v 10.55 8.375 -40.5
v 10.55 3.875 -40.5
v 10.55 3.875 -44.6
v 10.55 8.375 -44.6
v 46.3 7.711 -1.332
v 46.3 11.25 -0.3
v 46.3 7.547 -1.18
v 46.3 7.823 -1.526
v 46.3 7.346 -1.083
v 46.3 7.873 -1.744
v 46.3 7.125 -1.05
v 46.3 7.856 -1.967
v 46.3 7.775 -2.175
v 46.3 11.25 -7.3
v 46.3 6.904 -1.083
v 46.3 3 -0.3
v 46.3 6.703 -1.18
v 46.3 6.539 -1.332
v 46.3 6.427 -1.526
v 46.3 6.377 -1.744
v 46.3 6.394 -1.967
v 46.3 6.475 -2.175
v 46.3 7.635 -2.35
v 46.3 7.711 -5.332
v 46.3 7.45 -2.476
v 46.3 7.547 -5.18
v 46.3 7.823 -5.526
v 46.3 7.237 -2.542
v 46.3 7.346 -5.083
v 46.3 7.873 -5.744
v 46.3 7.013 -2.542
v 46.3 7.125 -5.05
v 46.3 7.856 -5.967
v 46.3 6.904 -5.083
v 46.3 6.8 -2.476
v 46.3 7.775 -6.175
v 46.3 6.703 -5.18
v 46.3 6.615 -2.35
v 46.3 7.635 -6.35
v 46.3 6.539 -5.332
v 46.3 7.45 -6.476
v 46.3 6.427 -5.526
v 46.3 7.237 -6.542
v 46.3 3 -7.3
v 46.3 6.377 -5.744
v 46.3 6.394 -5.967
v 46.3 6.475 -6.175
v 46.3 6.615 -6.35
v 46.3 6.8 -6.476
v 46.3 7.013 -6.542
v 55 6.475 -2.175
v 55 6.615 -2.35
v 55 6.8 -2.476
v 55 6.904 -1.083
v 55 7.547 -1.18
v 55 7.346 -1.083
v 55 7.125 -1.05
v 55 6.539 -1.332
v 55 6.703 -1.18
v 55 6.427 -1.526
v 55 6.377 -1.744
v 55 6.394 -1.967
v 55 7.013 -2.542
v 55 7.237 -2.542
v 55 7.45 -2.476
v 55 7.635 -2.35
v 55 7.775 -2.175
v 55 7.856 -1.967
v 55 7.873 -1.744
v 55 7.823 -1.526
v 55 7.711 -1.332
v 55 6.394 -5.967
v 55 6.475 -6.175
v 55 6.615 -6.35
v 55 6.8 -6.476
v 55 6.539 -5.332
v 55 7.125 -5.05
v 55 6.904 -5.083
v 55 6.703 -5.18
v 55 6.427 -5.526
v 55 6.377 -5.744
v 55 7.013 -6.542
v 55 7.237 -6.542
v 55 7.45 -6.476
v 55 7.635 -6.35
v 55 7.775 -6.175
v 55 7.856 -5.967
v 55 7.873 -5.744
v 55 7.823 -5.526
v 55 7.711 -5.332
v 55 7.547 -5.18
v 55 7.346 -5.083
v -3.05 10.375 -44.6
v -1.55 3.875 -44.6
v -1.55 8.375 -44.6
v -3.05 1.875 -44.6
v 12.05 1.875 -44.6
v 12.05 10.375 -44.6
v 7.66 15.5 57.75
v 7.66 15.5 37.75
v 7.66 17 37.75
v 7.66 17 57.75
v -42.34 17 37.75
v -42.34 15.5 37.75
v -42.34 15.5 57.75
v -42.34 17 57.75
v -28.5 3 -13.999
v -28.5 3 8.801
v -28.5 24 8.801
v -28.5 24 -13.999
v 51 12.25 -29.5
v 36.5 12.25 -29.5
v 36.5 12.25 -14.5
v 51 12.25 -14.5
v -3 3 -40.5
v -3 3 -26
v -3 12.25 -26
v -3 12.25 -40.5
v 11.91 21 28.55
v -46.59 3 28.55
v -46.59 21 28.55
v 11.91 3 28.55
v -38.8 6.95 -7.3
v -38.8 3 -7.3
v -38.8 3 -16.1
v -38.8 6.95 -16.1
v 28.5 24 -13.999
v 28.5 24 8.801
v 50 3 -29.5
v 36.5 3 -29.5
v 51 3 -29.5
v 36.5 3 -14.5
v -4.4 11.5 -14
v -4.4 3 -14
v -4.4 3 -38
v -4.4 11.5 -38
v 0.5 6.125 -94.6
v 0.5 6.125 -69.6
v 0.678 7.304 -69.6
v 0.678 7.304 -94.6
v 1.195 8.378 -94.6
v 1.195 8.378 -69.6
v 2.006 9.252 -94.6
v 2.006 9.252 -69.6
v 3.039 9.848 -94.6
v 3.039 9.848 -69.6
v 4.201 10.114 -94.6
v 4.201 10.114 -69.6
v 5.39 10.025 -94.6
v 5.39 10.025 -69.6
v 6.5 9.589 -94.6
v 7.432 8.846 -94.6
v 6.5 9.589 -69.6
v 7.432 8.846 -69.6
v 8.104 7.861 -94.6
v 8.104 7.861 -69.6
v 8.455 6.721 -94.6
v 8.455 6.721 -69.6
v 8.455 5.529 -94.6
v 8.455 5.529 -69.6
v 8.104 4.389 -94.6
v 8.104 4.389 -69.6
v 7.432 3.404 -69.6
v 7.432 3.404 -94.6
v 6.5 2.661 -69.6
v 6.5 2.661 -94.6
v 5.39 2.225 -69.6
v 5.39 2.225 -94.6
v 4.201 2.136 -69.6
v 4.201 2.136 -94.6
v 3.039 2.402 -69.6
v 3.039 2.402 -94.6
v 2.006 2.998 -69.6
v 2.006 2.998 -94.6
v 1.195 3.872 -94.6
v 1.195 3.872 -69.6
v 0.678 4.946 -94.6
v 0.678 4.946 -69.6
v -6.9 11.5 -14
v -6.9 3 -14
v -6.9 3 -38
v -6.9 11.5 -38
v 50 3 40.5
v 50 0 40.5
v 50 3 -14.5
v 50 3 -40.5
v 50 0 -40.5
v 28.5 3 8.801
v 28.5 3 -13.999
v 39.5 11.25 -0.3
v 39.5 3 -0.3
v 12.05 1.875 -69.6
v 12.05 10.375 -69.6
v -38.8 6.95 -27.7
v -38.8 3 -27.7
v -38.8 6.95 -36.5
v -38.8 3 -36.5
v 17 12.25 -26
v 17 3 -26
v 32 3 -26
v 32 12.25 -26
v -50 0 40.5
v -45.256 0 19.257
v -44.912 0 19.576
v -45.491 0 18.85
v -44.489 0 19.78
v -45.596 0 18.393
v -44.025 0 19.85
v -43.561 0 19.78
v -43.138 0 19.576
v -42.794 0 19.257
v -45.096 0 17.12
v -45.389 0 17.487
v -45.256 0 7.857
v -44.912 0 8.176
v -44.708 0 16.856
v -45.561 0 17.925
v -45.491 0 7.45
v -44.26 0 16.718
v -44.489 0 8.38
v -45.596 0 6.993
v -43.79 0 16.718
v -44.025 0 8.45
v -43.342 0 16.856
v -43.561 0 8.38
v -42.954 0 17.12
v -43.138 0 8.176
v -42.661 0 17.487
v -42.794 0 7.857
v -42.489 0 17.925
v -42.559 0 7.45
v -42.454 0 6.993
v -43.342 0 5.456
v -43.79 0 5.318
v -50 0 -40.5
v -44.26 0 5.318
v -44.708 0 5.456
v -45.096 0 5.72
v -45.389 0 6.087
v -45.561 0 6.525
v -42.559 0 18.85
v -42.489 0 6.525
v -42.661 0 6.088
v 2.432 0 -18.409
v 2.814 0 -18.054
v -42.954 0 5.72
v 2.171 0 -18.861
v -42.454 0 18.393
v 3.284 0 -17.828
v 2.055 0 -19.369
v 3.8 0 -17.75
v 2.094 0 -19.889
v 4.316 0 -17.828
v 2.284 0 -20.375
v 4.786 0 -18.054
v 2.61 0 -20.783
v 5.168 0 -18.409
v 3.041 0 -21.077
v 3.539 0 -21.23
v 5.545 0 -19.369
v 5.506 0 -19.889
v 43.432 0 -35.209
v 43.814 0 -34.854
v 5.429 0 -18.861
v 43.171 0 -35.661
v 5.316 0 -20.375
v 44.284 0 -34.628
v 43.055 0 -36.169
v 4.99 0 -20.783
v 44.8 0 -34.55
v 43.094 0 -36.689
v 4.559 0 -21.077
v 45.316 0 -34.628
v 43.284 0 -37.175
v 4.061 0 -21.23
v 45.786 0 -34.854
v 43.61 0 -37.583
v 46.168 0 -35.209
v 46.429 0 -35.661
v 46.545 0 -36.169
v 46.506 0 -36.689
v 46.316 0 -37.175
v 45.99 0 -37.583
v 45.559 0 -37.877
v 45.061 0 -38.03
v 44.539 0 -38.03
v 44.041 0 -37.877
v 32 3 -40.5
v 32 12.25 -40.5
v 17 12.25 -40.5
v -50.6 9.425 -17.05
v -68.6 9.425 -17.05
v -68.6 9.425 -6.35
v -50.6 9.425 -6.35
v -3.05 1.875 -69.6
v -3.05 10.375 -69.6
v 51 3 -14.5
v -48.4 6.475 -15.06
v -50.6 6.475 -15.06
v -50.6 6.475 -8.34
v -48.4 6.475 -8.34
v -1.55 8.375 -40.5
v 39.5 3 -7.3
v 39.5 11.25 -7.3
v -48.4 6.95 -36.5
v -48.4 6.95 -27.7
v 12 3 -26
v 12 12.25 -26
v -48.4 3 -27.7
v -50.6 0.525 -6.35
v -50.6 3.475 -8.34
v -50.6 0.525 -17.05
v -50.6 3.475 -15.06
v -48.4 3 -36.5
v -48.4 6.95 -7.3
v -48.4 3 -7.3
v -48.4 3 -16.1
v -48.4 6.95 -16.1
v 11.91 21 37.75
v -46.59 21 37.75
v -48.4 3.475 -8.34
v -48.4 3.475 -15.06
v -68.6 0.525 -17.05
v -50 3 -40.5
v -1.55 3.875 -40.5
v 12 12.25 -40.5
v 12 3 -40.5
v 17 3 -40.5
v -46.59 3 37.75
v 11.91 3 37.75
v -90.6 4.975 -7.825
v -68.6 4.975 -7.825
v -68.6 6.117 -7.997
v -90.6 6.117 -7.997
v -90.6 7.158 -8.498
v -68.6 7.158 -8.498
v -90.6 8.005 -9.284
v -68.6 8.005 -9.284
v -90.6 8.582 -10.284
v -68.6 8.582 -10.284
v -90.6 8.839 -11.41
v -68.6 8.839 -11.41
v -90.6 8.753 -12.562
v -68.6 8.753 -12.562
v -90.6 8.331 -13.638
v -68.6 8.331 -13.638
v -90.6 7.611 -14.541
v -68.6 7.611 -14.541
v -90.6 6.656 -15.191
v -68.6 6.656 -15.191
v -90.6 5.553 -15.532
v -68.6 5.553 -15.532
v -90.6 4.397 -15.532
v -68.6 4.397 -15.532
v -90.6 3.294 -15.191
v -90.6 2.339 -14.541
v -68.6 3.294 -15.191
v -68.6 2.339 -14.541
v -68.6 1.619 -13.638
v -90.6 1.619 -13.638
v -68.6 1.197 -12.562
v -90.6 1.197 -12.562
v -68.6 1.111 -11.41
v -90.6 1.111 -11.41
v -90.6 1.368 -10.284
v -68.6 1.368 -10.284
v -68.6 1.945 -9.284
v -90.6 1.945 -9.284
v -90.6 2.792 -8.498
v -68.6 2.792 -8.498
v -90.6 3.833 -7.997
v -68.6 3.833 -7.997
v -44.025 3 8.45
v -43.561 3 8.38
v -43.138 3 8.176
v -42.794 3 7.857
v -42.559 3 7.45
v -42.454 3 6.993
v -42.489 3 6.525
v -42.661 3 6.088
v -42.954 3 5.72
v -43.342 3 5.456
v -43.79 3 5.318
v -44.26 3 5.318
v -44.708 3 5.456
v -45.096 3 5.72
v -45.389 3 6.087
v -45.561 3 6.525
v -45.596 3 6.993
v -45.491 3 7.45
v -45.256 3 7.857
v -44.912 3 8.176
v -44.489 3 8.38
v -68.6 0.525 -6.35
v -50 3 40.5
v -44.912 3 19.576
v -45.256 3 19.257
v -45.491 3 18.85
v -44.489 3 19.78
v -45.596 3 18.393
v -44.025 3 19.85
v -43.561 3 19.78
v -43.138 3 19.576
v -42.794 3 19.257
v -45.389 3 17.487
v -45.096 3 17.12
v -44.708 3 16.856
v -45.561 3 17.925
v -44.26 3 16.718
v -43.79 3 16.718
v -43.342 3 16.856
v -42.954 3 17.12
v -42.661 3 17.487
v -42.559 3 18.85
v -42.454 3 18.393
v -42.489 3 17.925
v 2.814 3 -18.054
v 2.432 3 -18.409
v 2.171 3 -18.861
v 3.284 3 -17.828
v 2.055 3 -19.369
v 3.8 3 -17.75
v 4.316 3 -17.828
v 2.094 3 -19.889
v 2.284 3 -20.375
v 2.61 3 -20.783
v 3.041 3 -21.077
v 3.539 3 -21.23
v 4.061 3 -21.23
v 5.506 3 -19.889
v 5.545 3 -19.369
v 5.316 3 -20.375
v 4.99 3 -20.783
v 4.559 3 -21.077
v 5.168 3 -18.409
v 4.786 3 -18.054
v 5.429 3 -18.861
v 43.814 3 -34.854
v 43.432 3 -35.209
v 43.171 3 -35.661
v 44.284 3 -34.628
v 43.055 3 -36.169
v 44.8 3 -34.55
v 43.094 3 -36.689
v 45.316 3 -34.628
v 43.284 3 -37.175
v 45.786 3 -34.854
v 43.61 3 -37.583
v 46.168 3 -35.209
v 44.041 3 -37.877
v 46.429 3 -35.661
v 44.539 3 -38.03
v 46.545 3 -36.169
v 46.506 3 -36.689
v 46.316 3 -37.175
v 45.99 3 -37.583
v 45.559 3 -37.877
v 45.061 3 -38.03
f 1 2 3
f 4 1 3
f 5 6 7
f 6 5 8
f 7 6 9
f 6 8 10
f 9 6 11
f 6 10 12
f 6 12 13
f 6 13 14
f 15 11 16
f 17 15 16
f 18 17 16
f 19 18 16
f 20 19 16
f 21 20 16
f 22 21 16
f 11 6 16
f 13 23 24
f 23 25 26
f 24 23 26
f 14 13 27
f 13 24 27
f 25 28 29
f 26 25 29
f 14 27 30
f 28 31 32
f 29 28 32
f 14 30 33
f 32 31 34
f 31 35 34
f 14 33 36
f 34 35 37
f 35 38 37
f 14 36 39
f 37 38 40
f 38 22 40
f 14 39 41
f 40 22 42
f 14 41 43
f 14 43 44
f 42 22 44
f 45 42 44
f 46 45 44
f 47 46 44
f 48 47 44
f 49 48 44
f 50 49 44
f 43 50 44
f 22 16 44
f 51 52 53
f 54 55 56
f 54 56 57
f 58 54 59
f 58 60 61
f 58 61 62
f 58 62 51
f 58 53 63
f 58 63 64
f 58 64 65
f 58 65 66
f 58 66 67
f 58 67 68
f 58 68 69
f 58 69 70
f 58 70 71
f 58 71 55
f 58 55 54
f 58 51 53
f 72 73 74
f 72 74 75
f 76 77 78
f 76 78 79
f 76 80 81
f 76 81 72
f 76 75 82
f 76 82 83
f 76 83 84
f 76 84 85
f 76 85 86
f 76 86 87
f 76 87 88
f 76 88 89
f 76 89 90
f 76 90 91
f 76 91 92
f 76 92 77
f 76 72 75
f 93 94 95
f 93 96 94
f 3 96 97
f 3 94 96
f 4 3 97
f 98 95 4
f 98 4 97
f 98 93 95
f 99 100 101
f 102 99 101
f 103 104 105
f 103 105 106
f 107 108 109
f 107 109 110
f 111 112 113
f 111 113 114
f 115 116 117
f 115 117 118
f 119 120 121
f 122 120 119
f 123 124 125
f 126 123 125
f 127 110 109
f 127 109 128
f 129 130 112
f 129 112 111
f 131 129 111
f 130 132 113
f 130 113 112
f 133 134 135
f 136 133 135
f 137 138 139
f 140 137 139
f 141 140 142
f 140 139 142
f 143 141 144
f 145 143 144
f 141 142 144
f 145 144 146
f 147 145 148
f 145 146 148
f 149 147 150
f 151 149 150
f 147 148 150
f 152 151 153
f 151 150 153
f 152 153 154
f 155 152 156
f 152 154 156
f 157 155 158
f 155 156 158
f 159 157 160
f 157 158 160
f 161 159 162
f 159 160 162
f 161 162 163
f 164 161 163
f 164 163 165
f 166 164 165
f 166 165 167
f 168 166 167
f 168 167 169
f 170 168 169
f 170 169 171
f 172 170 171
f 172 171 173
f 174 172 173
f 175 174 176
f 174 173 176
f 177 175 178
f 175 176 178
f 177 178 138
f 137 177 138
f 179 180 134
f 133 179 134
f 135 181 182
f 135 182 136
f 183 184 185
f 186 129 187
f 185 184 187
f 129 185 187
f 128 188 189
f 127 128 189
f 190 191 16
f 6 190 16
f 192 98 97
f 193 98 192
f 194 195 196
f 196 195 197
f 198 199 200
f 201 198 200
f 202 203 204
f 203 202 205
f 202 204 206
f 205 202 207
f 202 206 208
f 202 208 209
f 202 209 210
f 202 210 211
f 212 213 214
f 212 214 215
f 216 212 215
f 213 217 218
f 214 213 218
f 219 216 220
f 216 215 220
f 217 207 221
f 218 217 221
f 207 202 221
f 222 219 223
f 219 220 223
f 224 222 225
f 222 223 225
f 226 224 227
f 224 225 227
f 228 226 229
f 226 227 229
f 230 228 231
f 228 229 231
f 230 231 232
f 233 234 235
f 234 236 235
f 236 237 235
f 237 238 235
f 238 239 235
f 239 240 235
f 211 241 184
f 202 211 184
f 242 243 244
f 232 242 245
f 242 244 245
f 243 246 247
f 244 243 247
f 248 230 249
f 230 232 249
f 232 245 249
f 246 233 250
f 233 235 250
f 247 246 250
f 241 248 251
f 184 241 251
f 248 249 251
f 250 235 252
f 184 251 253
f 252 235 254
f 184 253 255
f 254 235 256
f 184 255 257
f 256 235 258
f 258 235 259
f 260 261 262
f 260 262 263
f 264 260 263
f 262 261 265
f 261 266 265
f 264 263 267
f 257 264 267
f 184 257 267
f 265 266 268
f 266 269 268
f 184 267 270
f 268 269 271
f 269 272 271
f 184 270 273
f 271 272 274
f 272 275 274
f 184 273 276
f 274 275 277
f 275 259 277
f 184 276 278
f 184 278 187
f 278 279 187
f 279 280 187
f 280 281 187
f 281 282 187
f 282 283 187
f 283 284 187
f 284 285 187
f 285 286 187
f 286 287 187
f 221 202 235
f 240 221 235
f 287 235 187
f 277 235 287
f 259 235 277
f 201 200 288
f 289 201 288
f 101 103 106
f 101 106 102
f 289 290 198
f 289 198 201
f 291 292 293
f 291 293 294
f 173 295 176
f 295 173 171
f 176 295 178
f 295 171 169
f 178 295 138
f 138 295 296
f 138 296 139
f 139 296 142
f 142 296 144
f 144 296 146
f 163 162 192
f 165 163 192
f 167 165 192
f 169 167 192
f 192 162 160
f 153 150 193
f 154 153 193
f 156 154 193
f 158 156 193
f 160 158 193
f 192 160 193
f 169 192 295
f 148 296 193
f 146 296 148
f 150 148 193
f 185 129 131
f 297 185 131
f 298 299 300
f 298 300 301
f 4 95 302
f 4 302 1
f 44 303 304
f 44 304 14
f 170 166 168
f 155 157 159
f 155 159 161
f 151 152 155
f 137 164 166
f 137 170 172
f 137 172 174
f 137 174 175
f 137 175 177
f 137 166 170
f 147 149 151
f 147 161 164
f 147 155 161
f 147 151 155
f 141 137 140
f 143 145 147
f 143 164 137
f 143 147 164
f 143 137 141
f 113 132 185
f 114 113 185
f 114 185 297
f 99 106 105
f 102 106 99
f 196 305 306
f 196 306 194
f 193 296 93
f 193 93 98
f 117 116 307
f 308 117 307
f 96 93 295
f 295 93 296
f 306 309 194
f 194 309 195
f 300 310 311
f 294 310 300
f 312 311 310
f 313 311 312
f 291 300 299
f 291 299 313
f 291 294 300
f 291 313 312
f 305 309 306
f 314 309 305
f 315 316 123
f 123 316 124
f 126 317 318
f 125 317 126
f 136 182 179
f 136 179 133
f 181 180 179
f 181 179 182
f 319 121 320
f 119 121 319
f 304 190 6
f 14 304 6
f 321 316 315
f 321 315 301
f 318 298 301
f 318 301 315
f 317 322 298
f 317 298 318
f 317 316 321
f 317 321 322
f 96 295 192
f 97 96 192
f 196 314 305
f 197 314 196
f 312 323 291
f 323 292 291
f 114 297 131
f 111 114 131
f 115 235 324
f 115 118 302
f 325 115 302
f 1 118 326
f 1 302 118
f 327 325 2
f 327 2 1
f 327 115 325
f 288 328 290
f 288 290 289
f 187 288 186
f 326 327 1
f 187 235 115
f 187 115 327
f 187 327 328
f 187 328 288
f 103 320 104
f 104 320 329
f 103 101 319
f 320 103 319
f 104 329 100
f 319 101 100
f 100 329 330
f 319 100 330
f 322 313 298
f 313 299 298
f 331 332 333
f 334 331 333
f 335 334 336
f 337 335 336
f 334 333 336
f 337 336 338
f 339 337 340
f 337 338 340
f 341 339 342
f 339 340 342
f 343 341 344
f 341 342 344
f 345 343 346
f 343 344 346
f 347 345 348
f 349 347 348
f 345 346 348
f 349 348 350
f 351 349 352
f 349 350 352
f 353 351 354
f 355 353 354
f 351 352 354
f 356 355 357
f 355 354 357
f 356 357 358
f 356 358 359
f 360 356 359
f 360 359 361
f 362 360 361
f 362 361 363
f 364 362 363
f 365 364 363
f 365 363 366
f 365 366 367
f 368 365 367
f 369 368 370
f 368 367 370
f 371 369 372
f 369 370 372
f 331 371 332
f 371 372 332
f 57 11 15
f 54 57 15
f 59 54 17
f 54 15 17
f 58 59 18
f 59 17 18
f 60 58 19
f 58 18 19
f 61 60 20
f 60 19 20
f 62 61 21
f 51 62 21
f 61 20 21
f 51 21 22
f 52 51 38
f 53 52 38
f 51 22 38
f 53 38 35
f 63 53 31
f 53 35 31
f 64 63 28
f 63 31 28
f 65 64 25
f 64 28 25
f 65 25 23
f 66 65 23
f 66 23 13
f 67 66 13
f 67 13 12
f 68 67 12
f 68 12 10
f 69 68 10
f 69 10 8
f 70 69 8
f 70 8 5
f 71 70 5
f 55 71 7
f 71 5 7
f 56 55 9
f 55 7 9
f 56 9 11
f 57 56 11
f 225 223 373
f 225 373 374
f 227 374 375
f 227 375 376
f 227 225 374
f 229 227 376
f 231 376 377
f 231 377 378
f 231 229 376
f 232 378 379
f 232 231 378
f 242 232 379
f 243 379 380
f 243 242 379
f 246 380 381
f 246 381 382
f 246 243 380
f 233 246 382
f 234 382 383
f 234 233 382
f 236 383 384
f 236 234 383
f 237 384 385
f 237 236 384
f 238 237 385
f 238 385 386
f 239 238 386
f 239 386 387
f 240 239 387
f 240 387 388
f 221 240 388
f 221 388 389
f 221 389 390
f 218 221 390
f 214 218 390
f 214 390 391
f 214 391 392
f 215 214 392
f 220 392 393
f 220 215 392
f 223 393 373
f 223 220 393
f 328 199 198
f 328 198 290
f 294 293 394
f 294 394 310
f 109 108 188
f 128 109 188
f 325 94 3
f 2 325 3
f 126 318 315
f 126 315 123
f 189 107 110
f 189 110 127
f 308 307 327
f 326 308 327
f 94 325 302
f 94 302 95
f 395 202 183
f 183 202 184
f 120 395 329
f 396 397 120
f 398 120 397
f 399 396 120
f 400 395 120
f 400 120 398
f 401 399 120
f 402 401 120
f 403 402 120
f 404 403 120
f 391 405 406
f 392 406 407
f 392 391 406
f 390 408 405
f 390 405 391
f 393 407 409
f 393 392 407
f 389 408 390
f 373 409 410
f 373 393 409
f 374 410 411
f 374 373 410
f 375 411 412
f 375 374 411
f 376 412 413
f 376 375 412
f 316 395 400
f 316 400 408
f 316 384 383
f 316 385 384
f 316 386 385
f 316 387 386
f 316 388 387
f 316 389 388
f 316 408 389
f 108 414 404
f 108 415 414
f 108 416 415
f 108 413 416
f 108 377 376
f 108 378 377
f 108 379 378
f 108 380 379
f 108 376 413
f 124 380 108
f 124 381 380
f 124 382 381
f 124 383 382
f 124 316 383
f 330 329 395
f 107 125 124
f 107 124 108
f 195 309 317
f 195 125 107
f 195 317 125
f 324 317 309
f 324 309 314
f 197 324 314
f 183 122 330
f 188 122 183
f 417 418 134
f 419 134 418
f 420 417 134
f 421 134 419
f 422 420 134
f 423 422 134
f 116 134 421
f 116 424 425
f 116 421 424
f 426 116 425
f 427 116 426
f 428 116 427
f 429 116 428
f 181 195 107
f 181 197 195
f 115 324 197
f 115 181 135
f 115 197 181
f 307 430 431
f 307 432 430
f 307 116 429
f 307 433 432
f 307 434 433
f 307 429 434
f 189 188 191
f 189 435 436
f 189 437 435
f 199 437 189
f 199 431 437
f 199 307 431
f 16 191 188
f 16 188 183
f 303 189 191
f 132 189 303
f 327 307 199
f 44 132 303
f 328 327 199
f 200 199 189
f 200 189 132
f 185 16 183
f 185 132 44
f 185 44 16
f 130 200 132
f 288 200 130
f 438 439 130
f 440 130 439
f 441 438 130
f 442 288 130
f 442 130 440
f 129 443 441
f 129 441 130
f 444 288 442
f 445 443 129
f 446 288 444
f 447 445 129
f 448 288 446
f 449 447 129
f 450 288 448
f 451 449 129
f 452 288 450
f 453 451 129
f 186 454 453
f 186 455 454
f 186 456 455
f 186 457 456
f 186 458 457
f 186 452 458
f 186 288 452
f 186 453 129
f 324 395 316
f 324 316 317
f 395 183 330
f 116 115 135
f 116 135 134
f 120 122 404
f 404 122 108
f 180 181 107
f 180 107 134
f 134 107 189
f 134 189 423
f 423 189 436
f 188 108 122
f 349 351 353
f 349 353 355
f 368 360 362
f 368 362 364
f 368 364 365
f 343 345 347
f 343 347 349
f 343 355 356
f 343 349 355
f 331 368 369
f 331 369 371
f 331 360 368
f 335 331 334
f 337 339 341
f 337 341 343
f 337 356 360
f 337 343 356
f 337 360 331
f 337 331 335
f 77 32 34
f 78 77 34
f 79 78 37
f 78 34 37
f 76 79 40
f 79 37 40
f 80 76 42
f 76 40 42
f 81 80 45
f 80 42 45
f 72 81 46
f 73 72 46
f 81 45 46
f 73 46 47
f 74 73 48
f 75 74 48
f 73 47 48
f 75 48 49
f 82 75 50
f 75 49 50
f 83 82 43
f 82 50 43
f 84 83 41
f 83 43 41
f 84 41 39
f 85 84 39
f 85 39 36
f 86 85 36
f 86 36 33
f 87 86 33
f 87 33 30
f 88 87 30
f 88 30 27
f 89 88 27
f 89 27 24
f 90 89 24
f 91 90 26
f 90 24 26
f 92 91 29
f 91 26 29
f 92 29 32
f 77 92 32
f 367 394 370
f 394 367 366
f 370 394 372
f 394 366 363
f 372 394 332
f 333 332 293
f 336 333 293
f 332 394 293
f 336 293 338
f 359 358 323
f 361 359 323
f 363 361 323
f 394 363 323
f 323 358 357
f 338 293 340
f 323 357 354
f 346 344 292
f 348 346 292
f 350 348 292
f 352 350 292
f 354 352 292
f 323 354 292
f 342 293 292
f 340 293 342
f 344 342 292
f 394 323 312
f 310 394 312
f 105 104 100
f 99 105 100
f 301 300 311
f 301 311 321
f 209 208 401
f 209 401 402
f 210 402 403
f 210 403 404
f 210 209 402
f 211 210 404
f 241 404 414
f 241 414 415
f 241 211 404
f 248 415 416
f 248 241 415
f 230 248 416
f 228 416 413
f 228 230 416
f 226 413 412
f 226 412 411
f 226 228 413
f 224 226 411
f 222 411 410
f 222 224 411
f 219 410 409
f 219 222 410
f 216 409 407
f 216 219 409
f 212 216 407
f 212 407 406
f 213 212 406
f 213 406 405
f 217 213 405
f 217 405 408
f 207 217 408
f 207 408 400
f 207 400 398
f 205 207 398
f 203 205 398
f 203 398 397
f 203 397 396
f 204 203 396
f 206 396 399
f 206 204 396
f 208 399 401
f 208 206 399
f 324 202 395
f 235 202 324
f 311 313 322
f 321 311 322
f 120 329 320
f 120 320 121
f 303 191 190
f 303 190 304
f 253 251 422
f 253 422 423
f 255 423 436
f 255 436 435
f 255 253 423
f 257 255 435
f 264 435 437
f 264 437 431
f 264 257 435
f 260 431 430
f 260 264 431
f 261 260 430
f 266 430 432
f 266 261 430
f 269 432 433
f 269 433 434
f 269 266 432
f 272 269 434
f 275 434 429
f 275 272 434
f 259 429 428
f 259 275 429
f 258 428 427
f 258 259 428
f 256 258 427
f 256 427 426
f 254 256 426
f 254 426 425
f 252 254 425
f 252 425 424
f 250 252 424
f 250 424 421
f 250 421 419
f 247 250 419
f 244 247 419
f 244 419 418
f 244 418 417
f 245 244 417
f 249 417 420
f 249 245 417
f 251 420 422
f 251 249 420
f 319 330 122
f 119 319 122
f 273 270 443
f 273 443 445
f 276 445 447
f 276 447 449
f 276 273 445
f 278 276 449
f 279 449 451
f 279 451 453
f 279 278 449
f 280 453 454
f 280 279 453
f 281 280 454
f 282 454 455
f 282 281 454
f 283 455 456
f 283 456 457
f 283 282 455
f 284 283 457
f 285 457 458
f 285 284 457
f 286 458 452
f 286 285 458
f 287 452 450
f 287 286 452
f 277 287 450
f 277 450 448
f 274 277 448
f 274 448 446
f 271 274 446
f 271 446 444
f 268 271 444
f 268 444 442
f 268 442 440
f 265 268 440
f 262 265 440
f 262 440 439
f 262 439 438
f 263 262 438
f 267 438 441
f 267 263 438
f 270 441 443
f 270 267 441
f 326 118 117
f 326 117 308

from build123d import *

# Parameters (mm, degrees)
SKETCH1_W            = 100
SKETCH1_H            = 81
SKETCH1_R            = 1.75
SKETCH1_R_2          = 1.575
BOSS_EXTRUDE1_DEPTH  = 3
SKETCH2_W            = 58.5
SKETCH2_H            = 9.2
BOSS_EXTRUDE2_DEPTH  = 18
SKETCH3_W            = 50
SKETCH3_H            = 1.5
BOSS_EXTRUDE3_DEPTH  = 20
SKETCH4_W            = 14.5
SKETCH4_H            = 15
SKETCH4_W_2          = 15
SKETCH4_H_2          = 14.5
BOSS_EXTRUDE4_DEPTH  = 9.25
SKETCH5_W            = 2.5
SKETCH5_H            = 24
BOSS_EXTRUDE5_DEPTH  = 8.5
SKETCH6_W            = 12.1
SKETCH6_H            = 4.1
BOSS_EXTRUDE6_DEPTH  = 2.25
SKETCH6_3_W          = 15.1
SKETCH6_3_H          = 25
BOSS_EXTRUDE7_DEPTH  = 4.25
SKETCH7_R            = 4
BOSS_EXTRUDE8_DEPTH  = 25
SKETCH8_W            = 9.6
SKETCH8_H            = 8.8
BOSS_EXTRUDE9_DEPTH  = 3.95
SKETCH9_W            = 2.2
SKETCH9_H            = 6.72
BOSS_EXTRUDE10_DEPTH = 1.5
SKETCH9_3_W          = 18
SKETCH9_3_H          = 10.7
BOSS_EXTRUDE11_DEPTH = 4.45
SKETCH10_R           = 3.875
BOSS_EXTRUDE12_DEPTH = 22
SKETCH11_W           = 57
SKETCH11_H           = 22.8
BOSS_EXTRUDE13_DEPTH = 21
SKETCH12_W           = 6.8
SKETCH12_H           = 7
BOSS_EXTRUDE14_DEPTH = 8.25
SKETCH13_R           = 0.75
BOSS_EXTRUDE15_DEPTH = 8.7


with BuildPart() as part:
    # Sketch1 → Boss-Extrude1 (new body)
    with BuildSketch(Plane(origin=(0, 0, 0), x_dir=(1, 0, 0), z_dir=(0, 1, 0))):
        Rectangle(SKETCH1_W, SKETCH1_H)
        with Locations(Location((44.8, 36.3, 0), (0, 0, 270))):
            Circle(SKETCH1_R, mode=Mode.SUBTRACT)
        with Locations(Location((3.8, 19.5, 0), (0, 0, 270))):
            Circle(SKETCH1_R, mode=Mode.SUBTRACT)
        with Locations(Location((-44.025, -18.275, 0), (0, 0, 270))):
            Circle(SKETCH1_R_2, mode=Mode.SUBTRACT)
        with Locations(Location((-44.025, -6.875, 0), (0, 0, 270))):
            Circle(SKETCH1_R_2, mode=Mode.SUBTRACT)
    extrude(amount=BOSS_EXTRUDE1_DEPTH)

    # Sketch2 → Boss-Extrude2 (add)
    with BuildSketch(Plane(origin=(0, 3, 0), x_dir=(1, 0, 0), z_dir=(0, 1, 0))):
        with Locations((-17.34, -33.15)):
            Rectangle(SKETCH2_W, SKETCH2_H)
    extrude(amount=BOSS_EXTRUDE2_DEPTH)

    # Sketch3 → Boss-Extrude3 (add)
    with BuildSketch(Plane.XY.offset(37.75)):
        with Locations((-17.34, 16.25)):
            Rectangle(SKETCH3_W, SKETCH3_H)
    extrude(amount=BOSS_EXTRUDE3_DEPTH)

    # Sketch4 → Boss-Extrude4 (add)
    with BuildSketch(Plane(origin=(0, 3, 0), x_dir=(1, 0, 0), z_dir=(0, 1, 0))):
        with Locations((43.75, 22)):
            Rectangle(SKETCH4_W, SKETCH4_H)
        with Locations((4.5, 33.25)):
            Rectangle(SKETCH4_W_2, SKETCH4_H_2)
        with Locations((24.5, 33.25)):
            Rectangle(SKETCH4_W_2, SKETCH4_H_2)
    extrude(amount=BOSS_EXTRUDE4_DEPTH)

    # Sketch5 → Boss-Extrude5 (add)
    with BuildSketch(Plane(origin=(0, 3, 0), x_dir=(1, 0, 0), z_dir=(0, 1, 0))):
        with Locations((-5.65, 26)):
            Rectangle(SKETCH5_W, SKETCH5_H)
    extrude(amount=BOSS_EXTRUDE5_DEPTH)

    # Sketch6 → Boss-Extrude6 (add, symmetric)
    with BuildSketch(Plane(origin=(0, 6.125, 0), x_dir=(1, 0, 0), z_dir=(0, 1, 0))):
        with Locations((4.5, 42.55)):
            Rectangle(SKETCH6_W, SKETCH6_H)
    extrude(amount=BOSS_EXTRUDE6_DEPTH, both=True)

    # Sketch6<3> → Boss-Extrude7 (add, symmetric)
    with BuildSketch(Plane(origin=(0, 6.125, 0), x_dir=(1, 0, 0), z_dir=(0, 1, 0))):
        with Locations((4.5, 57.1)):
            Rectangle(SKETCH6_3_W, SKETCH6_3_H)
    extrude(amount=BOSS_EXTRUDE7_DEPTH, both=True)

    # Sketch7 → Boss-Extrude8 (add)
    with BuildSketch(Plane(origin=(0, 0, -69.6), x_dir=(-1, 0, 0), z_dir=(0, 0, -1))):
        with Locations((-4.5, 6.125)):
            Circle(SKETCH7_R)
    extrude(amount=BOSS_EXTRUDE8_DEPTH)

    # Sketch8 → Boss-Extrude9 (add)
    with BuildSketch(Plane(origin=(0, 3, 0), x_dir=(1, 0, 0), z_dir=(0, 1, 0))):
        with Locations((-43.6, 32.1)):
            Rectangle(SKETCH8_W, SKETCH8_H)
        with Locations((-43.6, 11.7)):
            Rectangle(SKETCH8_W, SKETCH8_H)
    extrude(amount=BOSS_EXTRUDE9_DEPTH)

    # Sketch9 → Boss-Extrude10 (add, symmetric)
    with BuildSketch(Plane(origin=(0, 4.975, 0), x_dir=(1, 0, 0), z_dir=(0, 1, 0))):
        with Locations((-49.5, 11.7)):
            Rectangle(SKETCH9_W, SKETCH9_H)
    extrude(amount=BOSS_EXTRUDE10_DEPTH, both=True)

    # Sketch9<3> → Boss-Extrude11 (add, symmetric)
    with BuildSketch(Plane(origin=(0, 4.975, 0), x_dir=(1, 0, 0), z_dir=(0, 1, 0))):
        with Locations((-59.6, 11.7)):
            Rectangle(SKETCH9_3_W, SKETCH9_3_H)
    extrude(amount=BOSS_EXTRUDE11_DEPTH, both=True)

    # Sketch10 → Boss-Extrude12 (add)
    with BuildSketch(Plane.ZY.offset(68.6)):
        with Locations((-11.7, 4.975)):
            Circle(SKETCH10_R)
    extrude(amount=BOSS_EXTRUDE12_DEPTH)

    # Sketch11 → Boss-Extrude13 (add)
    with BuildSketch(Plane(origin=(0, 3, 0), x_dir=(1, 0, 0), z_dir=(0, 1, 0))):
        with Locations((0, 2.599)):
            Rectangle(SKETCH11_W, SKETCH11_H)
    extrude(amount=BOSS_EXTRUDE13_DEPTH)

    # Sketch12 → Boss-Extrude14 (add)
    with BuildSketch(Plane(origin=(0, 3, 0), x_dir=(1, 0, 0), z_dir=(0, 1, 0))):
        with Locations((42.9, 3.8)):
            Rectangle(SKETCH12_W, SKETCH12_H)
    extrude(amount=BOSS_EXTRUDE14_DEPTH)

    # Sketch13 → Boss-Extrude15 (add)
    with BuildSketch(Plane(origin=(46.3, 0, 0), x_dir=(0, 0, -1), z_dir=(1, 0, 0))):
        with Locations(Location((1.8, 7.125, 0), (0, 0, 180))):
            Circle(SKETCH13_R)
        with Locations(Location((5.8, 7.125, 0), (0, 0, 180))):
            Circle(SKETCH13_R)
    extrude(amount=BOSS_EXTRUDE15_DEPTH)


solid = part.part
